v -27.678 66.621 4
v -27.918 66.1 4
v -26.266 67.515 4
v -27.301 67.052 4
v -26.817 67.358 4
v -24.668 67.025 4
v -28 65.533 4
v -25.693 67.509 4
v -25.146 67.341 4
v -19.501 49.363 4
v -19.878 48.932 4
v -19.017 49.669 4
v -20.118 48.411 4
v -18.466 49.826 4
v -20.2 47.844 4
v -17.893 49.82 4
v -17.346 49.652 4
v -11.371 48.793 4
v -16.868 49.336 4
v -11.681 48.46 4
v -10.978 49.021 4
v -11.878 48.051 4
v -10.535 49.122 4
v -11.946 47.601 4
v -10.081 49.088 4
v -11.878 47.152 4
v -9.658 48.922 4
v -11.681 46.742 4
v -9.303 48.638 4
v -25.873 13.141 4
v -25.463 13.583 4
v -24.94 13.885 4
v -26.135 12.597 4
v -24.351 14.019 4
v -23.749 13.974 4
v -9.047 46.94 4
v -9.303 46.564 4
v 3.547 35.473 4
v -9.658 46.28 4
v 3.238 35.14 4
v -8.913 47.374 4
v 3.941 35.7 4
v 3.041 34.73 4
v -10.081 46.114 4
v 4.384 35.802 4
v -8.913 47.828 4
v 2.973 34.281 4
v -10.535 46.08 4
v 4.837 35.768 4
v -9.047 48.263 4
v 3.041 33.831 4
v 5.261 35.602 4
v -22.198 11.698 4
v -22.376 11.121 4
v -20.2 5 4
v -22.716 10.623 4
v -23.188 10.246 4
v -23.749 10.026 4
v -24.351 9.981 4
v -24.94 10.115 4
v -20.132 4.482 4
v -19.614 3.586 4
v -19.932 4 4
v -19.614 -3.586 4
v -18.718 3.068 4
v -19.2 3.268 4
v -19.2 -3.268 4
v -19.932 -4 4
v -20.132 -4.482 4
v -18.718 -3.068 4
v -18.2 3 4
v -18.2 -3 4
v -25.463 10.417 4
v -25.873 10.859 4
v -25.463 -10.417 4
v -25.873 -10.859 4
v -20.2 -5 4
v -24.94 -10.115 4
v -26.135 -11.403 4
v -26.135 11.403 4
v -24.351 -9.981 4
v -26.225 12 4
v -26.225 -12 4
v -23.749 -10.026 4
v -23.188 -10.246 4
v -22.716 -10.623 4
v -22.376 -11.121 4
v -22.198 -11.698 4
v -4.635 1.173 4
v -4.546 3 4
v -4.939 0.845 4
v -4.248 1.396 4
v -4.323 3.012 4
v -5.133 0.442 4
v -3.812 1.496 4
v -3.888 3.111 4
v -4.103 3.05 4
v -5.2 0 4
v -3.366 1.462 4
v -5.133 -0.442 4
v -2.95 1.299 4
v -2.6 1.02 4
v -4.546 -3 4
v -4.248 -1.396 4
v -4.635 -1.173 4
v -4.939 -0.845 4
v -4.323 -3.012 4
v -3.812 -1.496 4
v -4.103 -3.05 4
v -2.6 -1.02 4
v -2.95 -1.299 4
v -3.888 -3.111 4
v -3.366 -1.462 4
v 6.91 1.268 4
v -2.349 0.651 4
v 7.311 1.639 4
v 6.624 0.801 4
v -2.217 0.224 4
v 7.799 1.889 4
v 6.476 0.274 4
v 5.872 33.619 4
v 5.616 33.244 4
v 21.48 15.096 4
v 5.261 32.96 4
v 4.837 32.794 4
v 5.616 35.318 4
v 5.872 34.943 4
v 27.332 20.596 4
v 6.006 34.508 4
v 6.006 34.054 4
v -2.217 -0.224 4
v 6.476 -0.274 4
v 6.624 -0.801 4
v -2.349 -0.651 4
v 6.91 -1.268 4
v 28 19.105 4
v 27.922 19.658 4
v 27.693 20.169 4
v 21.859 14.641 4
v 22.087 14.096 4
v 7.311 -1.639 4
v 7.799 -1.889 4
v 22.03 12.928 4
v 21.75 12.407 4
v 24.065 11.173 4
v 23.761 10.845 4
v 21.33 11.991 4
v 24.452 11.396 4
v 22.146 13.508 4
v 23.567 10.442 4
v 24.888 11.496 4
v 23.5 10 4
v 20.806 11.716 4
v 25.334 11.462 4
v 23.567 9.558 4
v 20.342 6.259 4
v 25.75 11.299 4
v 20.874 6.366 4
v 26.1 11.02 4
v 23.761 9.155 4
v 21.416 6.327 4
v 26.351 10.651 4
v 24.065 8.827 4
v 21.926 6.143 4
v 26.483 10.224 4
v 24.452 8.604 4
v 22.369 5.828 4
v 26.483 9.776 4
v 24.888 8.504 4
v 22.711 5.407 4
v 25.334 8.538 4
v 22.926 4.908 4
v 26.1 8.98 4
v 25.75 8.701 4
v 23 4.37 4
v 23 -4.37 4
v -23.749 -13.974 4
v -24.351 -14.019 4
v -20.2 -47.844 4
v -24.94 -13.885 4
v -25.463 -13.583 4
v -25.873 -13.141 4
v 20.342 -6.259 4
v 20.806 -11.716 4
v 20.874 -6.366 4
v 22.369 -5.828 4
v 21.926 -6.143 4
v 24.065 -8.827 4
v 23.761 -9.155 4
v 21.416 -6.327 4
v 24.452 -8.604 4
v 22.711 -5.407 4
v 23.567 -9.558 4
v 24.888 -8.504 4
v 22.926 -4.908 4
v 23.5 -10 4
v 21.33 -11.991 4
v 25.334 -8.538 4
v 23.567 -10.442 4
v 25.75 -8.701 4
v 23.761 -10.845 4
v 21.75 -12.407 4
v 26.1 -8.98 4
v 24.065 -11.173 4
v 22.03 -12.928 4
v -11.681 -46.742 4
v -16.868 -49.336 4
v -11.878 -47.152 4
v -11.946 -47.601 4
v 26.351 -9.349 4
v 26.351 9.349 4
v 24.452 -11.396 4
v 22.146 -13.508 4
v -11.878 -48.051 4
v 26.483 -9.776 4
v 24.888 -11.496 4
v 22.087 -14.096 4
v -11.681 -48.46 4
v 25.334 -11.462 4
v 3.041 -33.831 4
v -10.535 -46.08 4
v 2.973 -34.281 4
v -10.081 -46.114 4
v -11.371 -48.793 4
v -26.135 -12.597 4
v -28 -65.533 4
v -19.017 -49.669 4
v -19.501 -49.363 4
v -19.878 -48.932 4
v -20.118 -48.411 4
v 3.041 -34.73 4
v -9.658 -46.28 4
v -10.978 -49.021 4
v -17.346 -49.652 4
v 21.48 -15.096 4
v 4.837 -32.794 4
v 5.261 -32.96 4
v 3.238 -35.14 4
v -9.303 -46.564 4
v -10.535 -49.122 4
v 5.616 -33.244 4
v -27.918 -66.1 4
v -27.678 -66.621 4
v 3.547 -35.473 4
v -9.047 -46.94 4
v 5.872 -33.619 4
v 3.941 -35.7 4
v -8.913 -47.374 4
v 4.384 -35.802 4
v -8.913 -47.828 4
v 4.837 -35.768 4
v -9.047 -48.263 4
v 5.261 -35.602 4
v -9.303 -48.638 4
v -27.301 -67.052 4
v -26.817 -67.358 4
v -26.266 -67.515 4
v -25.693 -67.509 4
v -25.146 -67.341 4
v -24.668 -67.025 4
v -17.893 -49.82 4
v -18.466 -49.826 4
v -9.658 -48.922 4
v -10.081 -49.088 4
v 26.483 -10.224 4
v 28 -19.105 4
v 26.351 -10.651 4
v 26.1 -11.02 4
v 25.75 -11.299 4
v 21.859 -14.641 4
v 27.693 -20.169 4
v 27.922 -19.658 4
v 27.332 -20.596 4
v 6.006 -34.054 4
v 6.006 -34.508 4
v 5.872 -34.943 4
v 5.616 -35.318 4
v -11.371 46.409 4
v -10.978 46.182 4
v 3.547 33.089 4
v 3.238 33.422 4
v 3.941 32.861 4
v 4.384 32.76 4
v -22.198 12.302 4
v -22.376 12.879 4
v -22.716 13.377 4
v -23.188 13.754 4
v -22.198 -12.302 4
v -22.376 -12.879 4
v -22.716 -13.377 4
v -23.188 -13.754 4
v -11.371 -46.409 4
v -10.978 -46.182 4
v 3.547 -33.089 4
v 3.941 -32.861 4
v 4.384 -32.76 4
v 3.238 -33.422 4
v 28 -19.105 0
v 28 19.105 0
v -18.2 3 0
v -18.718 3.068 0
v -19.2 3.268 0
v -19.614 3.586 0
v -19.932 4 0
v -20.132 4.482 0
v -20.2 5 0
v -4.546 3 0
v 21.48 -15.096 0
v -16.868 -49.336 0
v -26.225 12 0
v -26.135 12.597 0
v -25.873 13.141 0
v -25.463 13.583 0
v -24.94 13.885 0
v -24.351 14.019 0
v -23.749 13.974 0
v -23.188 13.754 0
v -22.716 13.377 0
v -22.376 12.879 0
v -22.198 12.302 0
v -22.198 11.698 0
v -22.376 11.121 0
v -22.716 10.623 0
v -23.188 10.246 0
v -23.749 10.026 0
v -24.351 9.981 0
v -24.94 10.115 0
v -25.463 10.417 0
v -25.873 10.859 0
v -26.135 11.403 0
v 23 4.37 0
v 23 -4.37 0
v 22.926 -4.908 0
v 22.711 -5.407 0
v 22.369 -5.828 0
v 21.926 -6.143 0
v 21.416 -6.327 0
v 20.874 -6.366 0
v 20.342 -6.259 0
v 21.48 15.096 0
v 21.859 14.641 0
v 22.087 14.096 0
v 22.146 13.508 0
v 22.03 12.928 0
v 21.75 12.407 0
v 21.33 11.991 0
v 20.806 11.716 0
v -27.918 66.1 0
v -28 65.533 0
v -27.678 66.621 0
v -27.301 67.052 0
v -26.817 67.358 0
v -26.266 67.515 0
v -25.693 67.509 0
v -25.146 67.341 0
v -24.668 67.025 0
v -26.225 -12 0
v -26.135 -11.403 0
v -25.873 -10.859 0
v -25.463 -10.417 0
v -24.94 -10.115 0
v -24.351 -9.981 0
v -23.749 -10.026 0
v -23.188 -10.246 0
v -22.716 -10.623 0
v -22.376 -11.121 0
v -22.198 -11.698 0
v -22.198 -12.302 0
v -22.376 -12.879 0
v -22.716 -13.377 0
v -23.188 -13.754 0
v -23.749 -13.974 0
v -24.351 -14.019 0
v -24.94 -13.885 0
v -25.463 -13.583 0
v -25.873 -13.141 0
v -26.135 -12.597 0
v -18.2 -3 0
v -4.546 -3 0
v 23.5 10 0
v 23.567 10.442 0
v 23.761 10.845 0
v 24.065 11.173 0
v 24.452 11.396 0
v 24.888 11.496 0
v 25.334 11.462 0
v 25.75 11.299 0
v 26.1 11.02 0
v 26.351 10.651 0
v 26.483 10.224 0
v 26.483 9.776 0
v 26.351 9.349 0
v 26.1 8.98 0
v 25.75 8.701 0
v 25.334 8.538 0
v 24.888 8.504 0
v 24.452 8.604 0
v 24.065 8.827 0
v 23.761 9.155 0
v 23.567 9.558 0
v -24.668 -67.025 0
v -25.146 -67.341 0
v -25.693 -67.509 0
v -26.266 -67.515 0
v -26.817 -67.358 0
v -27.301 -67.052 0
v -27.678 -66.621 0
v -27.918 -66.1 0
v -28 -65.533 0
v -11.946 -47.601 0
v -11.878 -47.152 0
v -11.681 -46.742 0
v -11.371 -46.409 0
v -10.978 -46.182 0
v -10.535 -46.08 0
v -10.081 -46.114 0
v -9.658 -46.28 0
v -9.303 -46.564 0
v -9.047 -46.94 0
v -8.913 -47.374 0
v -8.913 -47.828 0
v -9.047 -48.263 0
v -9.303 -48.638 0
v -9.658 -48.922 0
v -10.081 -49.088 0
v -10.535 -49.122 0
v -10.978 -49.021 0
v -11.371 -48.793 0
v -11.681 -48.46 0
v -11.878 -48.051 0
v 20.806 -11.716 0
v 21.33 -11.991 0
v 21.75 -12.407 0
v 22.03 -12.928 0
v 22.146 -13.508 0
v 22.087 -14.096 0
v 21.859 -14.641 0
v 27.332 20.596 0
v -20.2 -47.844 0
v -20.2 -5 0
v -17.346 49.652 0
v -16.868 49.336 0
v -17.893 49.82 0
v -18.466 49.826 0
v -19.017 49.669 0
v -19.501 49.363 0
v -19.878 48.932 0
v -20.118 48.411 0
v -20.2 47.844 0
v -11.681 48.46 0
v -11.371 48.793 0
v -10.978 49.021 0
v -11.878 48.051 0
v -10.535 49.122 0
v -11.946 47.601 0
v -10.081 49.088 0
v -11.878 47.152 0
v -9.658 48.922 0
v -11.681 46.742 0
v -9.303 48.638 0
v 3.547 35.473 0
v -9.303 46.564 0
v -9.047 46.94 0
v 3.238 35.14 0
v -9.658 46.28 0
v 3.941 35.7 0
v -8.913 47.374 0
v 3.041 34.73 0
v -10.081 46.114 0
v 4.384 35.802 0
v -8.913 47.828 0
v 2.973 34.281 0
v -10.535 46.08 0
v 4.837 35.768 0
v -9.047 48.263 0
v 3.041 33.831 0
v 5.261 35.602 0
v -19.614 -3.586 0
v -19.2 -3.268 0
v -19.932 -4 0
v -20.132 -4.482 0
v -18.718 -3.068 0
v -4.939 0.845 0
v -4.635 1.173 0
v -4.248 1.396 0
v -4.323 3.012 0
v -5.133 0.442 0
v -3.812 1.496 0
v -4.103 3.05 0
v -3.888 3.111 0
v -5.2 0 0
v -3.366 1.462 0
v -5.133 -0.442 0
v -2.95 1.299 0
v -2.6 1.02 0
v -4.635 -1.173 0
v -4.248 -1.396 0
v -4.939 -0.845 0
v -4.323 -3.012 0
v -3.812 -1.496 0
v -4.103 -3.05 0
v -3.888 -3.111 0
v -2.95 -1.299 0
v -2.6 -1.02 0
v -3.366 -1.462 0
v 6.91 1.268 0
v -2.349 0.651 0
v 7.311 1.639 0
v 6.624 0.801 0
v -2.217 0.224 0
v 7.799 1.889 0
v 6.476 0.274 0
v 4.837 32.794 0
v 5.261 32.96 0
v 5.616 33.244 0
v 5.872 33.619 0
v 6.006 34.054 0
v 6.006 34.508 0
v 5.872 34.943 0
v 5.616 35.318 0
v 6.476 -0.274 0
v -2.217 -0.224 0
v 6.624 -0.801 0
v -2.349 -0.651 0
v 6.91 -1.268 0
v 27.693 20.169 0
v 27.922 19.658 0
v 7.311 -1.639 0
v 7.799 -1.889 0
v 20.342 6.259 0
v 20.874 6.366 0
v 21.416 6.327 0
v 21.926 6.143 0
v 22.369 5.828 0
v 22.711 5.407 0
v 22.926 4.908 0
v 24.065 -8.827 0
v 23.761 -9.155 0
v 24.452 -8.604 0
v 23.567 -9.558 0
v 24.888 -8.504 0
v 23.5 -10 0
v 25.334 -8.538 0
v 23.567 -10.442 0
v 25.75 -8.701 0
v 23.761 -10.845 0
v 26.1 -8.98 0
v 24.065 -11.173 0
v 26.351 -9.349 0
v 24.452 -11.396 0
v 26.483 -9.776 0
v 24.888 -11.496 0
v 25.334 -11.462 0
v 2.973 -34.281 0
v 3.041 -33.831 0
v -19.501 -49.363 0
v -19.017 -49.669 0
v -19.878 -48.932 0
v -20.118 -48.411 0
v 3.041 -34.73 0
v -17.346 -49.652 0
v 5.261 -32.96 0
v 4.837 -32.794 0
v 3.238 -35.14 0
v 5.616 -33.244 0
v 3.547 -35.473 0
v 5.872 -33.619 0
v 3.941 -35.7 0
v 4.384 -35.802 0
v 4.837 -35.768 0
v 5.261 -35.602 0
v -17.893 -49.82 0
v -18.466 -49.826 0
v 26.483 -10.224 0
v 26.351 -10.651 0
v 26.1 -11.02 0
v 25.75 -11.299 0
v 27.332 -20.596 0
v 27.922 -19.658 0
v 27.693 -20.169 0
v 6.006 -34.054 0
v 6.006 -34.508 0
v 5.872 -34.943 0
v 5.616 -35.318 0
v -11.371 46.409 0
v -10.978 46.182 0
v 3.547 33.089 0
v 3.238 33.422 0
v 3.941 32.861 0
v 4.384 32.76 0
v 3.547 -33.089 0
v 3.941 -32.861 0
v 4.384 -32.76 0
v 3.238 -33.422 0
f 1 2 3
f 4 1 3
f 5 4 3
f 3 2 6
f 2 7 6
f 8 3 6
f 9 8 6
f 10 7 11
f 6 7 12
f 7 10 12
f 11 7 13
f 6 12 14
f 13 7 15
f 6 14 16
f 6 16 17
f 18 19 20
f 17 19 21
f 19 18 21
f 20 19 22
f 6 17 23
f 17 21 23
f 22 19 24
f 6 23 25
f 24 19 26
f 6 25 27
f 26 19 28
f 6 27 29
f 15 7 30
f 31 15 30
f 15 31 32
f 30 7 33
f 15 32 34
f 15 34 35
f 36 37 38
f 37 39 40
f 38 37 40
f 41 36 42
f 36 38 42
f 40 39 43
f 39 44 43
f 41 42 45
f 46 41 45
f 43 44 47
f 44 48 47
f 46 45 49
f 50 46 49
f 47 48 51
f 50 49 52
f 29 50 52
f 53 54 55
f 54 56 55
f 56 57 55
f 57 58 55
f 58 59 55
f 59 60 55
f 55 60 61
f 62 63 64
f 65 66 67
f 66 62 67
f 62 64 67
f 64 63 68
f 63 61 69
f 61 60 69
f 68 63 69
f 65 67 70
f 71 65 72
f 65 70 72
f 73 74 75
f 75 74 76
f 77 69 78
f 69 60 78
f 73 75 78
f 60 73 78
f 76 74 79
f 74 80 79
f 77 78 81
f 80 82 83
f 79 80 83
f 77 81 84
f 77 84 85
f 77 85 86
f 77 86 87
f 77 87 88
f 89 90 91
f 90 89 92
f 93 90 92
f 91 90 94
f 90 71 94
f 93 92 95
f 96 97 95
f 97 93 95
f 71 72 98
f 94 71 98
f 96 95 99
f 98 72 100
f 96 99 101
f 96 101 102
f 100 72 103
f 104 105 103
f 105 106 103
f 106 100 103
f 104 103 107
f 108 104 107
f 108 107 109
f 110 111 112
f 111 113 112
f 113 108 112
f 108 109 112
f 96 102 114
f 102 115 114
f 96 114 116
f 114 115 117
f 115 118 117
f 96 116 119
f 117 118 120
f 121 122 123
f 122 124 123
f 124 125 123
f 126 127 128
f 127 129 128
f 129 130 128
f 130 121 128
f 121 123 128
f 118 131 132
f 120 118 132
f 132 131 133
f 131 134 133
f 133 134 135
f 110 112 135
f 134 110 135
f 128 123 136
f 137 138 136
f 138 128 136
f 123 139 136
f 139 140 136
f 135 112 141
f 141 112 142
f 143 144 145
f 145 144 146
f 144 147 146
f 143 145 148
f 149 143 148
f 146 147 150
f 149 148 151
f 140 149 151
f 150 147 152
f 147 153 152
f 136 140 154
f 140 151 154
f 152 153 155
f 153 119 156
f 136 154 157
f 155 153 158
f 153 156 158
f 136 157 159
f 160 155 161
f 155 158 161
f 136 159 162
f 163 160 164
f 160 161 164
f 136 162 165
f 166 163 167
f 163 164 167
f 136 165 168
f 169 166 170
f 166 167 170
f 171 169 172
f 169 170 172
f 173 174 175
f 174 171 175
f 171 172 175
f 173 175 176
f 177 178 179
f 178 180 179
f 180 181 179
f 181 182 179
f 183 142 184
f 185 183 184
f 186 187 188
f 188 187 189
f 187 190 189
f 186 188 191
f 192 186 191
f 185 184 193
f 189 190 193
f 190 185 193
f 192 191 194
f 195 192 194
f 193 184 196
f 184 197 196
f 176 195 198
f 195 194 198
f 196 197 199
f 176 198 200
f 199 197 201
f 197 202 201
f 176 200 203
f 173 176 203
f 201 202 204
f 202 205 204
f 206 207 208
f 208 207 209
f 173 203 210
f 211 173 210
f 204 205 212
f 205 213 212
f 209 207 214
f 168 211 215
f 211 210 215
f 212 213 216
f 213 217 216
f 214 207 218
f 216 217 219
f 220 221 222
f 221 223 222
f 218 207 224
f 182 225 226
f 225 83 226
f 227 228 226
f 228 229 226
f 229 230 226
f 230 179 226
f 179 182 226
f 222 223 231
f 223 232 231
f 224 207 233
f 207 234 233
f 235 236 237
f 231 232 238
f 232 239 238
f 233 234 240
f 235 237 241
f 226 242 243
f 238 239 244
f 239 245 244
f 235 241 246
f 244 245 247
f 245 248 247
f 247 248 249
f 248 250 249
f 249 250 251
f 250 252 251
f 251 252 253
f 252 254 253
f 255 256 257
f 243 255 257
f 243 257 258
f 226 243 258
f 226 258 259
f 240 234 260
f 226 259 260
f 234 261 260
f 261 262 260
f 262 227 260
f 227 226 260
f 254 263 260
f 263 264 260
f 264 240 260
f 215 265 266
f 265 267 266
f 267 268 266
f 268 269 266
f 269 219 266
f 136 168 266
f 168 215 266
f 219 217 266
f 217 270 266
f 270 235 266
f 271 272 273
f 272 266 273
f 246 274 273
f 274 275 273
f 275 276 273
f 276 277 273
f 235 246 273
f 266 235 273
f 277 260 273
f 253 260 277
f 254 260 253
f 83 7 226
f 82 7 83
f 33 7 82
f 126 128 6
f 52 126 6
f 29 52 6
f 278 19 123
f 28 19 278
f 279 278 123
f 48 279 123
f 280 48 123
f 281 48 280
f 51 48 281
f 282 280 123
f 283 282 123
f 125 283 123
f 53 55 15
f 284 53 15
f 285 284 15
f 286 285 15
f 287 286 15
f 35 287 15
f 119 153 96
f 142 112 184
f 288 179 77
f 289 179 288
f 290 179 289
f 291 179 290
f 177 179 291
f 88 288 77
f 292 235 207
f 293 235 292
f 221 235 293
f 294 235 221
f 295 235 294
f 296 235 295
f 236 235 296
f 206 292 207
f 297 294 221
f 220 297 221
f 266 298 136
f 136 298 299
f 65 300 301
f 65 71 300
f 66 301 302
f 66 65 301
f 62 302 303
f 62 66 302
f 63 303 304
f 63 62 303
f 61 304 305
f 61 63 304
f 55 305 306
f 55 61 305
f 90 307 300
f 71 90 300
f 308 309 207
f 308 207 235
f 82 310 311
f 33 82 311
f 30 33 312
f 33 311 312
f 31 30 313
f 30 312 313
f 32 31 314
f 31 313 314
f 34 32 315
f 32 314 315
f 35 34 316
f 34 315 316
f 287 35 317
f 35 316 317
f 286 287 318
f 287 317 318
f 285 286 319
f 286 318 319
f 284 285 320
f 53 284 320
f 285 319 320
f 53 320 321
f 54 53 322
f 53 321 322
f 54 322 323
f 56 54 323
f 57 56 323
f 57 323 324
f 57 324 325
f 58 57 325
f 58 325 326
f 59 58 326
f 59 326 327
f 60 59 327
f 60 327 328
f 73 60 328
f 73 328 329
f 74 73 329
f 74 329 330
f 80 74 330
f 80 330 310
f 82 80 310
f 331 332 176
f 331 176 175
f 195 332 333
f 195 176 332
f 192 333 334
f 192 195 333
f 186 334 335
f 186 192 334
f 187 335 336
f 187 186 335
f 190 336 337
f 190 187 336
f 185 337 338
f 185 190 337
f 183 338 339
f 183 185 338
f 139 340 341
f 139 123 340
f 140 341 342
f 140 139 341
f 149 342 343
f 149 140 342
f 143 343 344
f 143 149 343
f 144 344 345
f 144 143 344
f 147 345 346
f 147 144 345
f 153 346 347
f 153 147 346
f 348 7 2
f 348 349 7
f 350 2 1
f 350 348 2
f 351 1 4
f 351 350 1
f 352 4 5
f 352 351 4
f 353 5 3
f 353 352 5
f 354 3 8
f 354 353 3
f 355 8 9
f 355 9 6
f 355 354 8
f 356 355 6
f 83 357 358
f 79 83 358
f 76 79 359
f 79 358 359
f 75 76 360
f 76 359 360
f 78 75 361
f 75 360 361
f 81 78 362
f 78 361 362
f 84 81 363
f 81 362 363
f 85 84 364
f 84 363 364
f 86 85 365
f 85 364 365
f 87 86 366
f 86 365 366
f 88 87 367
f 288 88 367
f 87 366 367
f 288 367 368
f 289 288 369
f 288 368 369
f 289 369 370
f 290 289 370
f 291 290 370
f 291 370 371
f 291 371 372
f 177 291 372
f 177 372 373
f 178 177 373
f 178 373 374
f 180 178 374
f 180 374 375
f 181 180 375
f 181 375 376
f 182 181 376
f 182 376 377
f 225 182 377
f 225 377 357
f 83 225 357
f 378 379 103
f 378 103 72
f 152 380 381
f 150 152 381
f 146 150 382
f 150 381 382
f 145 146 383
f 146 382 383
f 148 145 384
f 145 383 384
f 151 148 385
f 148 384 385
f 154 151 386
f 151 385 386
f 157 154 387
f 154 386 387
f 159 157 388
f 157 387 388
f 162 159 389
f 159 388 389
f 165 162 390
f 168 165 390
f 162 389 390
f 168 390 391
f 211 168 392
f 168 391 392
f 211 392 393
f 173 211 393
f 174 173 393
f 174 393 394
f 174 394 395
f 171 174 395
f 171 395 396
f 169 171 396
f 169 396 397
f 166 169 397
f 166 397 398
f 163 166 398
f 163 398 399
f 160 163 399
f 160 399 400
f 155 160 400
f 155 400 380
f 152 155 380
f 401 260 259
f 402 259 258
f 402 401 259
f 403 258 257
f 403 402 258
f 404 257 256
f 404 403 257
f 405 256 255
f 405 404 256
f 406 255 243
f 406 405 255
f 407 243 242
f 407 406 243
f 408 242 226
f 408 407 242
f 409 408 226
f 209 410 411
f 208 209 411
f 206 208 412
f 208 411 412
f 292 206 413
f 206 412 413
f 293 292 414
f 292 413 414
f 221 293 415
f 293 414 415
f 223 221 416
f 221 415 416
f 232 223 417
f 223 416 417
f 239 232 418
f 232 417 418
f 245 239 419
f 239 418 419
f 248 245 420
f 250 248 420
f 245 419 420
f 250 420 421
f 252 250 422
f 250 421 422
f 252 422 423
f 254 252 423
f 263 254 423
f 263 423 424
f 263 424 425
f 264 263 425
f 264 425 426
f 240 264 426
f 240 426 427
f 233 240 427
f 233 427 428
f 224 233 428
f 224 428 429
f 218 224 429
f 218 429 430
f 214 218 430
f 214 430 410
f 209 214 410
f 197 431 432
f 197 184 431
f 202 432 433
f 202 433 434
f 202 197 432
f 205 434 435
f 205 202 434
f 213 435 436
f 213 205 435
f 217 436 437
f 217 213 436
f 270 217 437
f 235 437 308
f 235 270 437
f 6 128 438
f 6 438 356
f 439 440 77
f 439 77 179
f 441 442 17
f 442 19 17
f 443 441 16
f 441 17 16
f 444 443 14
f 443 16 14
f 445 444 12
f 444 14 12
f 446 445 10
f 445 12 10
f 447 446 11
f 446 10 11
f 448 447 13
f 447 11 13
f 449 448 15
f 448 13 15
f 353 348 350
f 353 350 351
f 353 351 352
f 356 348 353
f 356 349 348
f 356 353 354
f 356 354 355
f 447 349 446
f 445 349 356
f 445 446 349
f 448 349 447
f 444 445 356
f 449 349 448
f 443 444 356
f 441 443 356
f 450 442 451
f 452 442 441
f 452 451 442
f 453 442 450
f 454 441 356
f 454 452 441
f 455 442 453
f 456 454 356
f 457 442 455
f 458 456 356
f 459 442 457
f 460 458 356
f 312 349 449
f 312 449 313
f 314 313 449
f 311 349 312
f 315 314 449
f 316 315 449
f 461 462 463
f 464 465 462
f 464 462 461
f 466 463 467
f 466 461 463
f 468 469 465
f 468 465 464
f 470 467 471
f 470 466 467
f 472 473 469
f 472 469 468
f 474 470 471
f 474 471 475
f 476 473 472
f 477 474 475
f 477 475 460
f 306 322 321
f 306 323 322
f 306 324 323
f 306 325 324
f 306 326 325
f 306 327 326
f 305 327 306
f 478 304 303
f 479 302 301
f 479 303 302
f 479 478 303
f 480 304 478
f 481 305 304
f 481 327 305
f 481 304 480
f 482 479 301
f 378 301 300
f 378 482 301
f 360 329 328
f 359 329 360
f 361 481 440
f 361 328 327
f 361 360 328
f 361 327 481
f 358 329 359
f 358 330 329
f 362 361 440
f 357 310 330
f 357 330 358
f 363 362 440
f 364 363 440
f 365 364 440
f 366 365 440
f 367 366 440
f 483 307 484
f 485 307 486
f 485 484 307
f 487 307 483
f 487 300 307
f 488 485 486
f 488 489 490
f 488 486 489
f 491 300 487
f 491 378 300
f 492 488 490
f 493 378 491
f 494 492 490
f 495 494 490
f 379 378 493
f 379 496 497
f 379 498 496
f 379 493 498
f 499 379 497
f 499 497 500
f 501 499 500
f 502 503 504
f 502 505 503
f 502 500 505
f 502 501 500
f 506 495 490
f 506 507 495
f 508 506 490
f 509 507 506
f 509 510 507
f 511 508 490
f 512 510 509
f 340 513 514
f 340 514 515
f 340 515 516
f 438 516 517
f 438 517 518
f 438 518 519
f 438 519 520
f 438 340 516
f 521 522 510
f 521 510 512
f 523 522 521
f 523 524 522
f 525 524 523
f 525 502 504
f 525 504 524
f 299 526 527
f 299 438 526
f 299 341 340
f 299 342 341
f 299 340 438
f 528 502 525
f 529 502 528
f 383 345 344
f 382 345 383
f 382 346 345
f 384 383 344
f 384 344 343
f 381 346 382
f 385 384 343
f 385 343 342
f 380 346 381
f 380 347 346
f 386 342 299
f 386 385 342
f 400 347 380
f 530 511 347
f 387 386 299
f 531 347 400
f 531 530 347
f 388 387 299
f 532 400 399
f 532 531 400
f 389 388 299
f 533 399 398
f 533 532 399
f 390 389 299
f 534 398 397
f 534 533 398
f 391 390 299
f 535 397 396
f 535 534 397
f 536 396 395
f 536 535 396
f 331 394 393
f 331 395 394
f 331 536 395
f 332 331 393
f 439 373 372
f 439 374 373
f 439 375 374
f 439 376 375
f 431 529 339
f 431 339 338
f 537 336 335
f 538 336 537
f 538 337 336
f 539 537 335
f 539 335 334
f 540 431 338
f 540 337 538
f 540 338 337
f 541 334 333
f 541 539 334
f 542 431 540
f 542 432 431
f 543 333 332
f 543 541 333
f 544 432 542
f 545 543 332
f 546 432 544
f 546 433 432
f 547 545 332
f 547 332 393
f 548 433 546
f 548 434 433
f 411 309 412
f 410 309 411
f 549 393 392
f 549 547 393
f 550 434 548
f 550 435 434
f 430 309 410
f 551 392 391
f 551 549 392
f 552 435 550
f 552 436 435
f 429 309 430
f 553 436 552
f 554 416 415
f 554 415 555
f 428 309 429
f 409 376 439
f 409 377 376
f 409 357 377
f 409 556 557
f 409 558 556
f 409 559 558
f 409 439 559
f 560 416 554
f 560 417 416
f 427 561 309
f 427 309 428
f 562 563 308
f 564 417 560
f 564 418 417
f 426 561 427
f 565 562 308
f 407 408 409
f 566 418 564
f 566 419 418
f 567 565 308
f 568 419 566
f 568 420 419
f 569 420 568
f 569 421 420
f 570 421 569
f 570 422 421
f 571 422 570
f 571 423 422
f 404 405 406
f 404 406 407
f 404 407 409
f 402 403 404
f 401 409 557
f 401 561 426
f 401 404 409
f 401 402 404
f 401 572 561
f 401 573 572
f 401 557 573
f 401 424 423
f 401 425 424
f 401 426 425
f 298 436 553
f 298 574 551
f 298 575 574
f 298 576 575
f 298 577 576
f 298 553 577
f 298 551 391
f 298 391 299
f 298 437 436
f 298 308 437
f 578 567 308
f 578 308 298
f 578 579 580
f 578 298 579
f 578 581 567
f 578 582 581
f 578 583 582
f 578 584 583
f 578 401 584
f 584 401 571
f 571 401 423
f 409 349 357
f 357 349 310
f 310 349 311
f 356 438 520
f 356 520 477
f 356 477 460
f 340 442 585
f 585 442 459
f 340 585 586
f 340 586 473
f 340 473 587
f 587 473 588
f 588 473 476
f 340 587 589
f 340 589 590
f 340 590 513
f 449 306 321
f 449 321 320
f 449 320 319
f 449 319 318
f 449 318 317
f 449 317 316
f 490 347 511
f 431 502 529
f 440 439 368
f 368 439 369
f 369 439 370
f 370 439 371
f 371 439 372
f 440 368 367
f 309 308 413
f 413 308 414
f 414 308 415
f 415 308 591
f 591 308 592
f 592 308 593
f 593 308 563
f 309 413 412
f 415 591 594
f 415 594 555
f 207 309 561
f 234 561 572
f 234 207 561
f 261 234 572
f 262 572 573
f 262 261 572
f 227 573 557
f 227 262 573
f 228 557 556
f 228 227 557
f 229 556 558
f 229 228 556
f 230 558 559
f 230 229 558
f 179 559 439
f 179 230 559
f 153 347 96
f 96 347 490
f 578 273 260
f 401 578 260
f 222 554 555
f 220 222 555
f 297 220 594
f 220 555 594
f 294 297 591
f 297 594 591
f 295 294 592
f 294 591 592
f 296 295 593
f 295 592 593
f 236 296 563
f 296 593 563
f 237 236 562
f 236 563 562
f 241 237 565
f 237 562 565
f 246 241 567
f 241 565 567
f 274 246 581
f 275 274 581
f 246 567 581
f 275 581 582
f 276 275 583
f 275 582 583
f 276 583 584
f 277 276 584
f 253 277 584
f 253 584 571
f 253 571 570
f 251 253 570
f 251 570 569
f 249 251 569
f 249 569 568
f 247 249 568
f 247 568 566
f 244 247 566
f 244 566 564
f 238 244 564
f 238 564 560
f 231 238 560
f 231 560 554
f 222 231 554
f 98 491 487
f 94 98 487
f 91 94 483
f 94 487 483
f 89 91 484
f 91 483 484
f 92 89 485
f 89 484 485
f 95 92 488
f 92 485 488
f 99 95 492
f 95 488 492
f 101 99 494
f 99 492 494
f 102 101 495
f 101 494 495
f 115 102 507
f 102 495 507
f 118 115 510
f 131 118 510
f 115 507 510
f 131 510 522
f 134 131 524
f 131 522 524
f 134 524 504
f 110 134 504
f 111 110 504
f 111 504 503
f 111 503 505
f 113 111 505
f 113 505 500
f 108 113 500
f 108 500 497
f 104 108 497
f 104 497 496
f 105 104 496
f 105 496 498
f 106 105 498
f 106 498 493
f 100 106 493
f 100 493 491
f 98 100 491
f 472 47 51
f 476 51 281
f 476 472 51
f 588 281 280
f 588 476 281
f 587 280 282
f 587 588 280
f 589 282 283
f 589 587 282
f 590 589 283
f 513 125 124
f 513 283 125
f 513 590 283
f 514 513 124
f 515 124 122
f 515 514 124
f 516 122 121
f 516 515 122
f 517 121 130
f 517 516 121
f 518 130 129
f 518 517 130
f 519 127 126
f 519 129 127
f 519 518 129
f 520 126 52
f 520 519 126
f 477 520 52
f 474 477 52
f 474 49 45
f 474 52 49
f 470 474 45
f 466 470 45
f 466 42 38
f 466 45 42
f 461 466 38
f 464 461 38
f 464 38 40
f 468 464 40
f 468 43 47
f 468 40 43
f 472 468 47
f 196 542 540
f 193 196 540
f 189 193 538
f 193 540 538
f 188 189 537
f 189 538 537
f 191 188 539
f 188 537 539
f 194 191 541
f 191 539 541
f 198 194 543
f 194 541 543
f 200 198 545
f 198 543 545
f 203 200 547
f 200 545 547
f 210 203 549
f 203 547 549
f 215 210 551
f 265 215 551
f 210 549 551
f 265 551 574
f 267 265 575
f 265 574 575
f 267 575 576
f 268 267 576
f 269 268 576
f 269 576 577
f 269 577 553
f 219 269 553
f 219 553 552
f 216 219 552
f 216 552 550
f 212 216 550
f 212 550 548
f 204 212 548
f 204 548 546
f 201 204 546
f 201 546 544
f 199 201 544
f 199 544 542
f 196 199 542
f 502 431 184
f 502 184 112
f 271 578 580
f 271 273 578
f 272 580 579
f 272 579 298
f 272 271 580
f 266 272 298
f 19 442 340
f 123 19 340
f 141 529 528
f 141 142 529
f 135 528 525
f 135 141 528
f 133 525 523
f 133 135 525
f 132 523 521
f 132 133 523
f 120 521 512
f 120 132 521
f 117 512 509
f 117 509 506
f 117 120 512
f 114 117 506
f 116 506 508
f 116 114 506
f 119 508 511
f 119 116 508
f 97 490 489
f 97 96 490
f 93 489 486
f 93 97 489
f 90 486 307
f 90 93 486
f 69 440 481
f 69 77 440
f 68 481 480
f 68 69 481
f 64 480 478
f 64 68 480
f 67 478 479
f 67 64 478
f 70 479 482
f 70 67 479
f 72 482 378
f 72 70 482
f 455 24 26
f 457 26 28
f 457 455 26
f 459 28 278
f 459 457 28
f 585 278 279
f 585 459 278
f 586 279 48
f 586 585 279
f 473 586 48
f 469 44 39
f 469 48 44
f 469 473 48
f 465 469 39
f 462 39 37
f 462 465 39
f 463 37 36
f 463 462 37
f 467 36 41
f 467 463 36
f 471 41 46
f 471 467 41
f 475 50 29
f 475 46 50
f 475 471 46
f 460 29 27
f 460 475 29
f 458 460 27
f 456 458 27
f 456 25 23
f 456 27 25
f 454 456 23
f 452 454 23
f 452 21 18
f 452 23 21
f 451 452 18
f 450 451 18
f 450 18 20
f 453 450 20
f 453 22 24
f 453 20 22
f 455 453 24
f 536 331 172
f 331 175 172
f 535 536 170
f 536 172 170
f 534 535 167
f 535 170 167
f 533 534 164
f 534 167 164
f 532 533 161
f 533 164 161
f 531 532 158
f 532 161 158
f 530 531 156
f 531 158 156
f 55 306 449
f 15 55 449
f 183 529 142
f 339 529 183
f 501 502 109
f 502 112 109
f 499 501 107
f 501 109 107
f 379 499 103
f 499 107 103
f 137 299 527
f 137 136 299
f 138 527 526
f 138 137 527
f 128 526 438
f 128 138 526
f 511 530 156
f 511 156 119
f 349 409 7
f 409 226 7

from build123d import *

# Parameters (mm, degrees)
SKETCH_1_W          = 56
SKETCH_1_H          = 40
EXTRUDE_1_DEPTH     = 4
SKETCH_2_R          = 1.5
SKETCH_2_R_2        = 2.025
SKETCH_2_R_3        = 1.025
CUT_EXTRUDE_1_DEPTH = 34
EXTRUDE_2_DEPTH     = 4
SKETCH_4_R          = 1.525
CUT_EXTRUDE_2_DEPTH = 10
FILLET_1_R          = 2
CUT_EXTRUDE_3_DEPTH = 22
FILLET_2_R          = 2


with BuildPart() as part:
    # 草图1 → 凸台-拉伸1 (new body)
    with BuildSketch(Plane.XY):
        Rectangle(SKETCH_1_W, SKETCH_1_H)
    extrude(amount=EXTRUDE_1_DEPTH)

    # 草图2 → 切除-拉伸1 (cut)
    with BuildSketch(Plane(origin=(0, 0, 0), x_dir=(-1, 0, 0), z_dir=(0, 0, -1))):
        with Locations((3.7, 0)):
            Circle(SKETCH_2_R)
        with Locations((-25, 10)):
            Circle(SKETCH_2_R)
        with Locations((-25, -10)):
            Circle(SKETCH_2_R)
        with Locations((24.2, -12)):
            Circle(SKETCH_2_R_2)
        with Locations((24.2, 12)):
            Circle(SKETCH_2_R_2)
        with Locations((7.7, -9)):
            Circle(SKETCH_2_R_3)
        with Locations((15.7, -9)):
            Circle(SKETCH_2_R_3)
    extrude(amount=-CUT_EXTRUDE_1_DEPTH, mode=Mode.SUBTRACT)

    # 草图3 → 凸台-拉伸2 (add)
    with BuildSketch(Plane.XY.offset(4)):
        Polygon((28, 20), (-28, 70), (-28, 20), align=None)
    extrude_2 = extrude(amount=-EXTRUDE_2_DEPTH)

    # 镜向1: 凸台-拉伸2 across plane
    add(extrude_2.mirror(Plane.ZX))

    # 草图4 → 切除-拉伸2 (cut)
    with BuildSketch(Plane(origin=(0, 0, 0), x_dir=(-1, 0, 0), z_dir=(0, 0, -1))):
        with Locations((10.420660221, -47.601187919)):
            Circle(SKETCH_4_R)
        with Locations((-4.498093012, -34.280872533)):
            Circle(SKETCH_4_R)
    cut_extrude_2 = extrude(amount=-CUT_EXTRUDE_2_DEPTH, mode=Mode.SUBTRACT)

    # 镜向2: 切除-拉伸2 across plane
    add(cut_extrude_2.mirror(Plane.ZX), mode=Mode.SUBTRACT)

    # 圆角1
    fillet_1_edges = [part.edges().sort_by_distance(p)[0] for p in [
        (-28, 70, 2),
        (-28, -70, 2),
        (28, -20, 2),
        (28, 20, 2),
    ]]
    fillet(fillet_1_edges, radius=FILLET_1_R)

    # 草图5 → 切除-拉伸3 (cut)
    with BuildSketch(Plane(origin=(0, 0, 0), x_dir=(-1, 0, 0), z_dir=(0, 0, -1))):
        Polygon((-23, 7.185207752), (-2.378453751, 0), (-23, -7.185207752), align=None)
        Polygon((20.2, 52.310957498), (-24.014671549, 12.833572186), (4.207680626, 3), (20.2, 3), align=None)
        Polygon((4.207680626, -3), (20.2, -3), (20.2, -52.310957498), (-24.014671549, -12.833572186), align=None)
    extrude(amount=-CUT_EXTRUDE_3_DEPTH, mode=Mode.SUBTRACT)

    # 圆角2
    fillet_2_edges = [part.edges().sort_by_distance(p)[0] for p in [
        (24.014671549, -12.833572186, 2),
        (-4.207680626, -3, 2),
        (-20.2, -3, 2),
        (-20.2, -52.310957498, 2),
        (-20.2, 52.310957498, 2),
        (-20.2, 3, 2),
        (-4.207680626, 3, 2),
        (24.014671549, 12.833572186, 2),
        (23, -7.185207752, 2),
        (23, 7.185207752, 2),
        (2.378453751, 0, 2),
    ]]
    fillet(fillet_2_edges, radius=FILLET_2_R)


solid = part.part
